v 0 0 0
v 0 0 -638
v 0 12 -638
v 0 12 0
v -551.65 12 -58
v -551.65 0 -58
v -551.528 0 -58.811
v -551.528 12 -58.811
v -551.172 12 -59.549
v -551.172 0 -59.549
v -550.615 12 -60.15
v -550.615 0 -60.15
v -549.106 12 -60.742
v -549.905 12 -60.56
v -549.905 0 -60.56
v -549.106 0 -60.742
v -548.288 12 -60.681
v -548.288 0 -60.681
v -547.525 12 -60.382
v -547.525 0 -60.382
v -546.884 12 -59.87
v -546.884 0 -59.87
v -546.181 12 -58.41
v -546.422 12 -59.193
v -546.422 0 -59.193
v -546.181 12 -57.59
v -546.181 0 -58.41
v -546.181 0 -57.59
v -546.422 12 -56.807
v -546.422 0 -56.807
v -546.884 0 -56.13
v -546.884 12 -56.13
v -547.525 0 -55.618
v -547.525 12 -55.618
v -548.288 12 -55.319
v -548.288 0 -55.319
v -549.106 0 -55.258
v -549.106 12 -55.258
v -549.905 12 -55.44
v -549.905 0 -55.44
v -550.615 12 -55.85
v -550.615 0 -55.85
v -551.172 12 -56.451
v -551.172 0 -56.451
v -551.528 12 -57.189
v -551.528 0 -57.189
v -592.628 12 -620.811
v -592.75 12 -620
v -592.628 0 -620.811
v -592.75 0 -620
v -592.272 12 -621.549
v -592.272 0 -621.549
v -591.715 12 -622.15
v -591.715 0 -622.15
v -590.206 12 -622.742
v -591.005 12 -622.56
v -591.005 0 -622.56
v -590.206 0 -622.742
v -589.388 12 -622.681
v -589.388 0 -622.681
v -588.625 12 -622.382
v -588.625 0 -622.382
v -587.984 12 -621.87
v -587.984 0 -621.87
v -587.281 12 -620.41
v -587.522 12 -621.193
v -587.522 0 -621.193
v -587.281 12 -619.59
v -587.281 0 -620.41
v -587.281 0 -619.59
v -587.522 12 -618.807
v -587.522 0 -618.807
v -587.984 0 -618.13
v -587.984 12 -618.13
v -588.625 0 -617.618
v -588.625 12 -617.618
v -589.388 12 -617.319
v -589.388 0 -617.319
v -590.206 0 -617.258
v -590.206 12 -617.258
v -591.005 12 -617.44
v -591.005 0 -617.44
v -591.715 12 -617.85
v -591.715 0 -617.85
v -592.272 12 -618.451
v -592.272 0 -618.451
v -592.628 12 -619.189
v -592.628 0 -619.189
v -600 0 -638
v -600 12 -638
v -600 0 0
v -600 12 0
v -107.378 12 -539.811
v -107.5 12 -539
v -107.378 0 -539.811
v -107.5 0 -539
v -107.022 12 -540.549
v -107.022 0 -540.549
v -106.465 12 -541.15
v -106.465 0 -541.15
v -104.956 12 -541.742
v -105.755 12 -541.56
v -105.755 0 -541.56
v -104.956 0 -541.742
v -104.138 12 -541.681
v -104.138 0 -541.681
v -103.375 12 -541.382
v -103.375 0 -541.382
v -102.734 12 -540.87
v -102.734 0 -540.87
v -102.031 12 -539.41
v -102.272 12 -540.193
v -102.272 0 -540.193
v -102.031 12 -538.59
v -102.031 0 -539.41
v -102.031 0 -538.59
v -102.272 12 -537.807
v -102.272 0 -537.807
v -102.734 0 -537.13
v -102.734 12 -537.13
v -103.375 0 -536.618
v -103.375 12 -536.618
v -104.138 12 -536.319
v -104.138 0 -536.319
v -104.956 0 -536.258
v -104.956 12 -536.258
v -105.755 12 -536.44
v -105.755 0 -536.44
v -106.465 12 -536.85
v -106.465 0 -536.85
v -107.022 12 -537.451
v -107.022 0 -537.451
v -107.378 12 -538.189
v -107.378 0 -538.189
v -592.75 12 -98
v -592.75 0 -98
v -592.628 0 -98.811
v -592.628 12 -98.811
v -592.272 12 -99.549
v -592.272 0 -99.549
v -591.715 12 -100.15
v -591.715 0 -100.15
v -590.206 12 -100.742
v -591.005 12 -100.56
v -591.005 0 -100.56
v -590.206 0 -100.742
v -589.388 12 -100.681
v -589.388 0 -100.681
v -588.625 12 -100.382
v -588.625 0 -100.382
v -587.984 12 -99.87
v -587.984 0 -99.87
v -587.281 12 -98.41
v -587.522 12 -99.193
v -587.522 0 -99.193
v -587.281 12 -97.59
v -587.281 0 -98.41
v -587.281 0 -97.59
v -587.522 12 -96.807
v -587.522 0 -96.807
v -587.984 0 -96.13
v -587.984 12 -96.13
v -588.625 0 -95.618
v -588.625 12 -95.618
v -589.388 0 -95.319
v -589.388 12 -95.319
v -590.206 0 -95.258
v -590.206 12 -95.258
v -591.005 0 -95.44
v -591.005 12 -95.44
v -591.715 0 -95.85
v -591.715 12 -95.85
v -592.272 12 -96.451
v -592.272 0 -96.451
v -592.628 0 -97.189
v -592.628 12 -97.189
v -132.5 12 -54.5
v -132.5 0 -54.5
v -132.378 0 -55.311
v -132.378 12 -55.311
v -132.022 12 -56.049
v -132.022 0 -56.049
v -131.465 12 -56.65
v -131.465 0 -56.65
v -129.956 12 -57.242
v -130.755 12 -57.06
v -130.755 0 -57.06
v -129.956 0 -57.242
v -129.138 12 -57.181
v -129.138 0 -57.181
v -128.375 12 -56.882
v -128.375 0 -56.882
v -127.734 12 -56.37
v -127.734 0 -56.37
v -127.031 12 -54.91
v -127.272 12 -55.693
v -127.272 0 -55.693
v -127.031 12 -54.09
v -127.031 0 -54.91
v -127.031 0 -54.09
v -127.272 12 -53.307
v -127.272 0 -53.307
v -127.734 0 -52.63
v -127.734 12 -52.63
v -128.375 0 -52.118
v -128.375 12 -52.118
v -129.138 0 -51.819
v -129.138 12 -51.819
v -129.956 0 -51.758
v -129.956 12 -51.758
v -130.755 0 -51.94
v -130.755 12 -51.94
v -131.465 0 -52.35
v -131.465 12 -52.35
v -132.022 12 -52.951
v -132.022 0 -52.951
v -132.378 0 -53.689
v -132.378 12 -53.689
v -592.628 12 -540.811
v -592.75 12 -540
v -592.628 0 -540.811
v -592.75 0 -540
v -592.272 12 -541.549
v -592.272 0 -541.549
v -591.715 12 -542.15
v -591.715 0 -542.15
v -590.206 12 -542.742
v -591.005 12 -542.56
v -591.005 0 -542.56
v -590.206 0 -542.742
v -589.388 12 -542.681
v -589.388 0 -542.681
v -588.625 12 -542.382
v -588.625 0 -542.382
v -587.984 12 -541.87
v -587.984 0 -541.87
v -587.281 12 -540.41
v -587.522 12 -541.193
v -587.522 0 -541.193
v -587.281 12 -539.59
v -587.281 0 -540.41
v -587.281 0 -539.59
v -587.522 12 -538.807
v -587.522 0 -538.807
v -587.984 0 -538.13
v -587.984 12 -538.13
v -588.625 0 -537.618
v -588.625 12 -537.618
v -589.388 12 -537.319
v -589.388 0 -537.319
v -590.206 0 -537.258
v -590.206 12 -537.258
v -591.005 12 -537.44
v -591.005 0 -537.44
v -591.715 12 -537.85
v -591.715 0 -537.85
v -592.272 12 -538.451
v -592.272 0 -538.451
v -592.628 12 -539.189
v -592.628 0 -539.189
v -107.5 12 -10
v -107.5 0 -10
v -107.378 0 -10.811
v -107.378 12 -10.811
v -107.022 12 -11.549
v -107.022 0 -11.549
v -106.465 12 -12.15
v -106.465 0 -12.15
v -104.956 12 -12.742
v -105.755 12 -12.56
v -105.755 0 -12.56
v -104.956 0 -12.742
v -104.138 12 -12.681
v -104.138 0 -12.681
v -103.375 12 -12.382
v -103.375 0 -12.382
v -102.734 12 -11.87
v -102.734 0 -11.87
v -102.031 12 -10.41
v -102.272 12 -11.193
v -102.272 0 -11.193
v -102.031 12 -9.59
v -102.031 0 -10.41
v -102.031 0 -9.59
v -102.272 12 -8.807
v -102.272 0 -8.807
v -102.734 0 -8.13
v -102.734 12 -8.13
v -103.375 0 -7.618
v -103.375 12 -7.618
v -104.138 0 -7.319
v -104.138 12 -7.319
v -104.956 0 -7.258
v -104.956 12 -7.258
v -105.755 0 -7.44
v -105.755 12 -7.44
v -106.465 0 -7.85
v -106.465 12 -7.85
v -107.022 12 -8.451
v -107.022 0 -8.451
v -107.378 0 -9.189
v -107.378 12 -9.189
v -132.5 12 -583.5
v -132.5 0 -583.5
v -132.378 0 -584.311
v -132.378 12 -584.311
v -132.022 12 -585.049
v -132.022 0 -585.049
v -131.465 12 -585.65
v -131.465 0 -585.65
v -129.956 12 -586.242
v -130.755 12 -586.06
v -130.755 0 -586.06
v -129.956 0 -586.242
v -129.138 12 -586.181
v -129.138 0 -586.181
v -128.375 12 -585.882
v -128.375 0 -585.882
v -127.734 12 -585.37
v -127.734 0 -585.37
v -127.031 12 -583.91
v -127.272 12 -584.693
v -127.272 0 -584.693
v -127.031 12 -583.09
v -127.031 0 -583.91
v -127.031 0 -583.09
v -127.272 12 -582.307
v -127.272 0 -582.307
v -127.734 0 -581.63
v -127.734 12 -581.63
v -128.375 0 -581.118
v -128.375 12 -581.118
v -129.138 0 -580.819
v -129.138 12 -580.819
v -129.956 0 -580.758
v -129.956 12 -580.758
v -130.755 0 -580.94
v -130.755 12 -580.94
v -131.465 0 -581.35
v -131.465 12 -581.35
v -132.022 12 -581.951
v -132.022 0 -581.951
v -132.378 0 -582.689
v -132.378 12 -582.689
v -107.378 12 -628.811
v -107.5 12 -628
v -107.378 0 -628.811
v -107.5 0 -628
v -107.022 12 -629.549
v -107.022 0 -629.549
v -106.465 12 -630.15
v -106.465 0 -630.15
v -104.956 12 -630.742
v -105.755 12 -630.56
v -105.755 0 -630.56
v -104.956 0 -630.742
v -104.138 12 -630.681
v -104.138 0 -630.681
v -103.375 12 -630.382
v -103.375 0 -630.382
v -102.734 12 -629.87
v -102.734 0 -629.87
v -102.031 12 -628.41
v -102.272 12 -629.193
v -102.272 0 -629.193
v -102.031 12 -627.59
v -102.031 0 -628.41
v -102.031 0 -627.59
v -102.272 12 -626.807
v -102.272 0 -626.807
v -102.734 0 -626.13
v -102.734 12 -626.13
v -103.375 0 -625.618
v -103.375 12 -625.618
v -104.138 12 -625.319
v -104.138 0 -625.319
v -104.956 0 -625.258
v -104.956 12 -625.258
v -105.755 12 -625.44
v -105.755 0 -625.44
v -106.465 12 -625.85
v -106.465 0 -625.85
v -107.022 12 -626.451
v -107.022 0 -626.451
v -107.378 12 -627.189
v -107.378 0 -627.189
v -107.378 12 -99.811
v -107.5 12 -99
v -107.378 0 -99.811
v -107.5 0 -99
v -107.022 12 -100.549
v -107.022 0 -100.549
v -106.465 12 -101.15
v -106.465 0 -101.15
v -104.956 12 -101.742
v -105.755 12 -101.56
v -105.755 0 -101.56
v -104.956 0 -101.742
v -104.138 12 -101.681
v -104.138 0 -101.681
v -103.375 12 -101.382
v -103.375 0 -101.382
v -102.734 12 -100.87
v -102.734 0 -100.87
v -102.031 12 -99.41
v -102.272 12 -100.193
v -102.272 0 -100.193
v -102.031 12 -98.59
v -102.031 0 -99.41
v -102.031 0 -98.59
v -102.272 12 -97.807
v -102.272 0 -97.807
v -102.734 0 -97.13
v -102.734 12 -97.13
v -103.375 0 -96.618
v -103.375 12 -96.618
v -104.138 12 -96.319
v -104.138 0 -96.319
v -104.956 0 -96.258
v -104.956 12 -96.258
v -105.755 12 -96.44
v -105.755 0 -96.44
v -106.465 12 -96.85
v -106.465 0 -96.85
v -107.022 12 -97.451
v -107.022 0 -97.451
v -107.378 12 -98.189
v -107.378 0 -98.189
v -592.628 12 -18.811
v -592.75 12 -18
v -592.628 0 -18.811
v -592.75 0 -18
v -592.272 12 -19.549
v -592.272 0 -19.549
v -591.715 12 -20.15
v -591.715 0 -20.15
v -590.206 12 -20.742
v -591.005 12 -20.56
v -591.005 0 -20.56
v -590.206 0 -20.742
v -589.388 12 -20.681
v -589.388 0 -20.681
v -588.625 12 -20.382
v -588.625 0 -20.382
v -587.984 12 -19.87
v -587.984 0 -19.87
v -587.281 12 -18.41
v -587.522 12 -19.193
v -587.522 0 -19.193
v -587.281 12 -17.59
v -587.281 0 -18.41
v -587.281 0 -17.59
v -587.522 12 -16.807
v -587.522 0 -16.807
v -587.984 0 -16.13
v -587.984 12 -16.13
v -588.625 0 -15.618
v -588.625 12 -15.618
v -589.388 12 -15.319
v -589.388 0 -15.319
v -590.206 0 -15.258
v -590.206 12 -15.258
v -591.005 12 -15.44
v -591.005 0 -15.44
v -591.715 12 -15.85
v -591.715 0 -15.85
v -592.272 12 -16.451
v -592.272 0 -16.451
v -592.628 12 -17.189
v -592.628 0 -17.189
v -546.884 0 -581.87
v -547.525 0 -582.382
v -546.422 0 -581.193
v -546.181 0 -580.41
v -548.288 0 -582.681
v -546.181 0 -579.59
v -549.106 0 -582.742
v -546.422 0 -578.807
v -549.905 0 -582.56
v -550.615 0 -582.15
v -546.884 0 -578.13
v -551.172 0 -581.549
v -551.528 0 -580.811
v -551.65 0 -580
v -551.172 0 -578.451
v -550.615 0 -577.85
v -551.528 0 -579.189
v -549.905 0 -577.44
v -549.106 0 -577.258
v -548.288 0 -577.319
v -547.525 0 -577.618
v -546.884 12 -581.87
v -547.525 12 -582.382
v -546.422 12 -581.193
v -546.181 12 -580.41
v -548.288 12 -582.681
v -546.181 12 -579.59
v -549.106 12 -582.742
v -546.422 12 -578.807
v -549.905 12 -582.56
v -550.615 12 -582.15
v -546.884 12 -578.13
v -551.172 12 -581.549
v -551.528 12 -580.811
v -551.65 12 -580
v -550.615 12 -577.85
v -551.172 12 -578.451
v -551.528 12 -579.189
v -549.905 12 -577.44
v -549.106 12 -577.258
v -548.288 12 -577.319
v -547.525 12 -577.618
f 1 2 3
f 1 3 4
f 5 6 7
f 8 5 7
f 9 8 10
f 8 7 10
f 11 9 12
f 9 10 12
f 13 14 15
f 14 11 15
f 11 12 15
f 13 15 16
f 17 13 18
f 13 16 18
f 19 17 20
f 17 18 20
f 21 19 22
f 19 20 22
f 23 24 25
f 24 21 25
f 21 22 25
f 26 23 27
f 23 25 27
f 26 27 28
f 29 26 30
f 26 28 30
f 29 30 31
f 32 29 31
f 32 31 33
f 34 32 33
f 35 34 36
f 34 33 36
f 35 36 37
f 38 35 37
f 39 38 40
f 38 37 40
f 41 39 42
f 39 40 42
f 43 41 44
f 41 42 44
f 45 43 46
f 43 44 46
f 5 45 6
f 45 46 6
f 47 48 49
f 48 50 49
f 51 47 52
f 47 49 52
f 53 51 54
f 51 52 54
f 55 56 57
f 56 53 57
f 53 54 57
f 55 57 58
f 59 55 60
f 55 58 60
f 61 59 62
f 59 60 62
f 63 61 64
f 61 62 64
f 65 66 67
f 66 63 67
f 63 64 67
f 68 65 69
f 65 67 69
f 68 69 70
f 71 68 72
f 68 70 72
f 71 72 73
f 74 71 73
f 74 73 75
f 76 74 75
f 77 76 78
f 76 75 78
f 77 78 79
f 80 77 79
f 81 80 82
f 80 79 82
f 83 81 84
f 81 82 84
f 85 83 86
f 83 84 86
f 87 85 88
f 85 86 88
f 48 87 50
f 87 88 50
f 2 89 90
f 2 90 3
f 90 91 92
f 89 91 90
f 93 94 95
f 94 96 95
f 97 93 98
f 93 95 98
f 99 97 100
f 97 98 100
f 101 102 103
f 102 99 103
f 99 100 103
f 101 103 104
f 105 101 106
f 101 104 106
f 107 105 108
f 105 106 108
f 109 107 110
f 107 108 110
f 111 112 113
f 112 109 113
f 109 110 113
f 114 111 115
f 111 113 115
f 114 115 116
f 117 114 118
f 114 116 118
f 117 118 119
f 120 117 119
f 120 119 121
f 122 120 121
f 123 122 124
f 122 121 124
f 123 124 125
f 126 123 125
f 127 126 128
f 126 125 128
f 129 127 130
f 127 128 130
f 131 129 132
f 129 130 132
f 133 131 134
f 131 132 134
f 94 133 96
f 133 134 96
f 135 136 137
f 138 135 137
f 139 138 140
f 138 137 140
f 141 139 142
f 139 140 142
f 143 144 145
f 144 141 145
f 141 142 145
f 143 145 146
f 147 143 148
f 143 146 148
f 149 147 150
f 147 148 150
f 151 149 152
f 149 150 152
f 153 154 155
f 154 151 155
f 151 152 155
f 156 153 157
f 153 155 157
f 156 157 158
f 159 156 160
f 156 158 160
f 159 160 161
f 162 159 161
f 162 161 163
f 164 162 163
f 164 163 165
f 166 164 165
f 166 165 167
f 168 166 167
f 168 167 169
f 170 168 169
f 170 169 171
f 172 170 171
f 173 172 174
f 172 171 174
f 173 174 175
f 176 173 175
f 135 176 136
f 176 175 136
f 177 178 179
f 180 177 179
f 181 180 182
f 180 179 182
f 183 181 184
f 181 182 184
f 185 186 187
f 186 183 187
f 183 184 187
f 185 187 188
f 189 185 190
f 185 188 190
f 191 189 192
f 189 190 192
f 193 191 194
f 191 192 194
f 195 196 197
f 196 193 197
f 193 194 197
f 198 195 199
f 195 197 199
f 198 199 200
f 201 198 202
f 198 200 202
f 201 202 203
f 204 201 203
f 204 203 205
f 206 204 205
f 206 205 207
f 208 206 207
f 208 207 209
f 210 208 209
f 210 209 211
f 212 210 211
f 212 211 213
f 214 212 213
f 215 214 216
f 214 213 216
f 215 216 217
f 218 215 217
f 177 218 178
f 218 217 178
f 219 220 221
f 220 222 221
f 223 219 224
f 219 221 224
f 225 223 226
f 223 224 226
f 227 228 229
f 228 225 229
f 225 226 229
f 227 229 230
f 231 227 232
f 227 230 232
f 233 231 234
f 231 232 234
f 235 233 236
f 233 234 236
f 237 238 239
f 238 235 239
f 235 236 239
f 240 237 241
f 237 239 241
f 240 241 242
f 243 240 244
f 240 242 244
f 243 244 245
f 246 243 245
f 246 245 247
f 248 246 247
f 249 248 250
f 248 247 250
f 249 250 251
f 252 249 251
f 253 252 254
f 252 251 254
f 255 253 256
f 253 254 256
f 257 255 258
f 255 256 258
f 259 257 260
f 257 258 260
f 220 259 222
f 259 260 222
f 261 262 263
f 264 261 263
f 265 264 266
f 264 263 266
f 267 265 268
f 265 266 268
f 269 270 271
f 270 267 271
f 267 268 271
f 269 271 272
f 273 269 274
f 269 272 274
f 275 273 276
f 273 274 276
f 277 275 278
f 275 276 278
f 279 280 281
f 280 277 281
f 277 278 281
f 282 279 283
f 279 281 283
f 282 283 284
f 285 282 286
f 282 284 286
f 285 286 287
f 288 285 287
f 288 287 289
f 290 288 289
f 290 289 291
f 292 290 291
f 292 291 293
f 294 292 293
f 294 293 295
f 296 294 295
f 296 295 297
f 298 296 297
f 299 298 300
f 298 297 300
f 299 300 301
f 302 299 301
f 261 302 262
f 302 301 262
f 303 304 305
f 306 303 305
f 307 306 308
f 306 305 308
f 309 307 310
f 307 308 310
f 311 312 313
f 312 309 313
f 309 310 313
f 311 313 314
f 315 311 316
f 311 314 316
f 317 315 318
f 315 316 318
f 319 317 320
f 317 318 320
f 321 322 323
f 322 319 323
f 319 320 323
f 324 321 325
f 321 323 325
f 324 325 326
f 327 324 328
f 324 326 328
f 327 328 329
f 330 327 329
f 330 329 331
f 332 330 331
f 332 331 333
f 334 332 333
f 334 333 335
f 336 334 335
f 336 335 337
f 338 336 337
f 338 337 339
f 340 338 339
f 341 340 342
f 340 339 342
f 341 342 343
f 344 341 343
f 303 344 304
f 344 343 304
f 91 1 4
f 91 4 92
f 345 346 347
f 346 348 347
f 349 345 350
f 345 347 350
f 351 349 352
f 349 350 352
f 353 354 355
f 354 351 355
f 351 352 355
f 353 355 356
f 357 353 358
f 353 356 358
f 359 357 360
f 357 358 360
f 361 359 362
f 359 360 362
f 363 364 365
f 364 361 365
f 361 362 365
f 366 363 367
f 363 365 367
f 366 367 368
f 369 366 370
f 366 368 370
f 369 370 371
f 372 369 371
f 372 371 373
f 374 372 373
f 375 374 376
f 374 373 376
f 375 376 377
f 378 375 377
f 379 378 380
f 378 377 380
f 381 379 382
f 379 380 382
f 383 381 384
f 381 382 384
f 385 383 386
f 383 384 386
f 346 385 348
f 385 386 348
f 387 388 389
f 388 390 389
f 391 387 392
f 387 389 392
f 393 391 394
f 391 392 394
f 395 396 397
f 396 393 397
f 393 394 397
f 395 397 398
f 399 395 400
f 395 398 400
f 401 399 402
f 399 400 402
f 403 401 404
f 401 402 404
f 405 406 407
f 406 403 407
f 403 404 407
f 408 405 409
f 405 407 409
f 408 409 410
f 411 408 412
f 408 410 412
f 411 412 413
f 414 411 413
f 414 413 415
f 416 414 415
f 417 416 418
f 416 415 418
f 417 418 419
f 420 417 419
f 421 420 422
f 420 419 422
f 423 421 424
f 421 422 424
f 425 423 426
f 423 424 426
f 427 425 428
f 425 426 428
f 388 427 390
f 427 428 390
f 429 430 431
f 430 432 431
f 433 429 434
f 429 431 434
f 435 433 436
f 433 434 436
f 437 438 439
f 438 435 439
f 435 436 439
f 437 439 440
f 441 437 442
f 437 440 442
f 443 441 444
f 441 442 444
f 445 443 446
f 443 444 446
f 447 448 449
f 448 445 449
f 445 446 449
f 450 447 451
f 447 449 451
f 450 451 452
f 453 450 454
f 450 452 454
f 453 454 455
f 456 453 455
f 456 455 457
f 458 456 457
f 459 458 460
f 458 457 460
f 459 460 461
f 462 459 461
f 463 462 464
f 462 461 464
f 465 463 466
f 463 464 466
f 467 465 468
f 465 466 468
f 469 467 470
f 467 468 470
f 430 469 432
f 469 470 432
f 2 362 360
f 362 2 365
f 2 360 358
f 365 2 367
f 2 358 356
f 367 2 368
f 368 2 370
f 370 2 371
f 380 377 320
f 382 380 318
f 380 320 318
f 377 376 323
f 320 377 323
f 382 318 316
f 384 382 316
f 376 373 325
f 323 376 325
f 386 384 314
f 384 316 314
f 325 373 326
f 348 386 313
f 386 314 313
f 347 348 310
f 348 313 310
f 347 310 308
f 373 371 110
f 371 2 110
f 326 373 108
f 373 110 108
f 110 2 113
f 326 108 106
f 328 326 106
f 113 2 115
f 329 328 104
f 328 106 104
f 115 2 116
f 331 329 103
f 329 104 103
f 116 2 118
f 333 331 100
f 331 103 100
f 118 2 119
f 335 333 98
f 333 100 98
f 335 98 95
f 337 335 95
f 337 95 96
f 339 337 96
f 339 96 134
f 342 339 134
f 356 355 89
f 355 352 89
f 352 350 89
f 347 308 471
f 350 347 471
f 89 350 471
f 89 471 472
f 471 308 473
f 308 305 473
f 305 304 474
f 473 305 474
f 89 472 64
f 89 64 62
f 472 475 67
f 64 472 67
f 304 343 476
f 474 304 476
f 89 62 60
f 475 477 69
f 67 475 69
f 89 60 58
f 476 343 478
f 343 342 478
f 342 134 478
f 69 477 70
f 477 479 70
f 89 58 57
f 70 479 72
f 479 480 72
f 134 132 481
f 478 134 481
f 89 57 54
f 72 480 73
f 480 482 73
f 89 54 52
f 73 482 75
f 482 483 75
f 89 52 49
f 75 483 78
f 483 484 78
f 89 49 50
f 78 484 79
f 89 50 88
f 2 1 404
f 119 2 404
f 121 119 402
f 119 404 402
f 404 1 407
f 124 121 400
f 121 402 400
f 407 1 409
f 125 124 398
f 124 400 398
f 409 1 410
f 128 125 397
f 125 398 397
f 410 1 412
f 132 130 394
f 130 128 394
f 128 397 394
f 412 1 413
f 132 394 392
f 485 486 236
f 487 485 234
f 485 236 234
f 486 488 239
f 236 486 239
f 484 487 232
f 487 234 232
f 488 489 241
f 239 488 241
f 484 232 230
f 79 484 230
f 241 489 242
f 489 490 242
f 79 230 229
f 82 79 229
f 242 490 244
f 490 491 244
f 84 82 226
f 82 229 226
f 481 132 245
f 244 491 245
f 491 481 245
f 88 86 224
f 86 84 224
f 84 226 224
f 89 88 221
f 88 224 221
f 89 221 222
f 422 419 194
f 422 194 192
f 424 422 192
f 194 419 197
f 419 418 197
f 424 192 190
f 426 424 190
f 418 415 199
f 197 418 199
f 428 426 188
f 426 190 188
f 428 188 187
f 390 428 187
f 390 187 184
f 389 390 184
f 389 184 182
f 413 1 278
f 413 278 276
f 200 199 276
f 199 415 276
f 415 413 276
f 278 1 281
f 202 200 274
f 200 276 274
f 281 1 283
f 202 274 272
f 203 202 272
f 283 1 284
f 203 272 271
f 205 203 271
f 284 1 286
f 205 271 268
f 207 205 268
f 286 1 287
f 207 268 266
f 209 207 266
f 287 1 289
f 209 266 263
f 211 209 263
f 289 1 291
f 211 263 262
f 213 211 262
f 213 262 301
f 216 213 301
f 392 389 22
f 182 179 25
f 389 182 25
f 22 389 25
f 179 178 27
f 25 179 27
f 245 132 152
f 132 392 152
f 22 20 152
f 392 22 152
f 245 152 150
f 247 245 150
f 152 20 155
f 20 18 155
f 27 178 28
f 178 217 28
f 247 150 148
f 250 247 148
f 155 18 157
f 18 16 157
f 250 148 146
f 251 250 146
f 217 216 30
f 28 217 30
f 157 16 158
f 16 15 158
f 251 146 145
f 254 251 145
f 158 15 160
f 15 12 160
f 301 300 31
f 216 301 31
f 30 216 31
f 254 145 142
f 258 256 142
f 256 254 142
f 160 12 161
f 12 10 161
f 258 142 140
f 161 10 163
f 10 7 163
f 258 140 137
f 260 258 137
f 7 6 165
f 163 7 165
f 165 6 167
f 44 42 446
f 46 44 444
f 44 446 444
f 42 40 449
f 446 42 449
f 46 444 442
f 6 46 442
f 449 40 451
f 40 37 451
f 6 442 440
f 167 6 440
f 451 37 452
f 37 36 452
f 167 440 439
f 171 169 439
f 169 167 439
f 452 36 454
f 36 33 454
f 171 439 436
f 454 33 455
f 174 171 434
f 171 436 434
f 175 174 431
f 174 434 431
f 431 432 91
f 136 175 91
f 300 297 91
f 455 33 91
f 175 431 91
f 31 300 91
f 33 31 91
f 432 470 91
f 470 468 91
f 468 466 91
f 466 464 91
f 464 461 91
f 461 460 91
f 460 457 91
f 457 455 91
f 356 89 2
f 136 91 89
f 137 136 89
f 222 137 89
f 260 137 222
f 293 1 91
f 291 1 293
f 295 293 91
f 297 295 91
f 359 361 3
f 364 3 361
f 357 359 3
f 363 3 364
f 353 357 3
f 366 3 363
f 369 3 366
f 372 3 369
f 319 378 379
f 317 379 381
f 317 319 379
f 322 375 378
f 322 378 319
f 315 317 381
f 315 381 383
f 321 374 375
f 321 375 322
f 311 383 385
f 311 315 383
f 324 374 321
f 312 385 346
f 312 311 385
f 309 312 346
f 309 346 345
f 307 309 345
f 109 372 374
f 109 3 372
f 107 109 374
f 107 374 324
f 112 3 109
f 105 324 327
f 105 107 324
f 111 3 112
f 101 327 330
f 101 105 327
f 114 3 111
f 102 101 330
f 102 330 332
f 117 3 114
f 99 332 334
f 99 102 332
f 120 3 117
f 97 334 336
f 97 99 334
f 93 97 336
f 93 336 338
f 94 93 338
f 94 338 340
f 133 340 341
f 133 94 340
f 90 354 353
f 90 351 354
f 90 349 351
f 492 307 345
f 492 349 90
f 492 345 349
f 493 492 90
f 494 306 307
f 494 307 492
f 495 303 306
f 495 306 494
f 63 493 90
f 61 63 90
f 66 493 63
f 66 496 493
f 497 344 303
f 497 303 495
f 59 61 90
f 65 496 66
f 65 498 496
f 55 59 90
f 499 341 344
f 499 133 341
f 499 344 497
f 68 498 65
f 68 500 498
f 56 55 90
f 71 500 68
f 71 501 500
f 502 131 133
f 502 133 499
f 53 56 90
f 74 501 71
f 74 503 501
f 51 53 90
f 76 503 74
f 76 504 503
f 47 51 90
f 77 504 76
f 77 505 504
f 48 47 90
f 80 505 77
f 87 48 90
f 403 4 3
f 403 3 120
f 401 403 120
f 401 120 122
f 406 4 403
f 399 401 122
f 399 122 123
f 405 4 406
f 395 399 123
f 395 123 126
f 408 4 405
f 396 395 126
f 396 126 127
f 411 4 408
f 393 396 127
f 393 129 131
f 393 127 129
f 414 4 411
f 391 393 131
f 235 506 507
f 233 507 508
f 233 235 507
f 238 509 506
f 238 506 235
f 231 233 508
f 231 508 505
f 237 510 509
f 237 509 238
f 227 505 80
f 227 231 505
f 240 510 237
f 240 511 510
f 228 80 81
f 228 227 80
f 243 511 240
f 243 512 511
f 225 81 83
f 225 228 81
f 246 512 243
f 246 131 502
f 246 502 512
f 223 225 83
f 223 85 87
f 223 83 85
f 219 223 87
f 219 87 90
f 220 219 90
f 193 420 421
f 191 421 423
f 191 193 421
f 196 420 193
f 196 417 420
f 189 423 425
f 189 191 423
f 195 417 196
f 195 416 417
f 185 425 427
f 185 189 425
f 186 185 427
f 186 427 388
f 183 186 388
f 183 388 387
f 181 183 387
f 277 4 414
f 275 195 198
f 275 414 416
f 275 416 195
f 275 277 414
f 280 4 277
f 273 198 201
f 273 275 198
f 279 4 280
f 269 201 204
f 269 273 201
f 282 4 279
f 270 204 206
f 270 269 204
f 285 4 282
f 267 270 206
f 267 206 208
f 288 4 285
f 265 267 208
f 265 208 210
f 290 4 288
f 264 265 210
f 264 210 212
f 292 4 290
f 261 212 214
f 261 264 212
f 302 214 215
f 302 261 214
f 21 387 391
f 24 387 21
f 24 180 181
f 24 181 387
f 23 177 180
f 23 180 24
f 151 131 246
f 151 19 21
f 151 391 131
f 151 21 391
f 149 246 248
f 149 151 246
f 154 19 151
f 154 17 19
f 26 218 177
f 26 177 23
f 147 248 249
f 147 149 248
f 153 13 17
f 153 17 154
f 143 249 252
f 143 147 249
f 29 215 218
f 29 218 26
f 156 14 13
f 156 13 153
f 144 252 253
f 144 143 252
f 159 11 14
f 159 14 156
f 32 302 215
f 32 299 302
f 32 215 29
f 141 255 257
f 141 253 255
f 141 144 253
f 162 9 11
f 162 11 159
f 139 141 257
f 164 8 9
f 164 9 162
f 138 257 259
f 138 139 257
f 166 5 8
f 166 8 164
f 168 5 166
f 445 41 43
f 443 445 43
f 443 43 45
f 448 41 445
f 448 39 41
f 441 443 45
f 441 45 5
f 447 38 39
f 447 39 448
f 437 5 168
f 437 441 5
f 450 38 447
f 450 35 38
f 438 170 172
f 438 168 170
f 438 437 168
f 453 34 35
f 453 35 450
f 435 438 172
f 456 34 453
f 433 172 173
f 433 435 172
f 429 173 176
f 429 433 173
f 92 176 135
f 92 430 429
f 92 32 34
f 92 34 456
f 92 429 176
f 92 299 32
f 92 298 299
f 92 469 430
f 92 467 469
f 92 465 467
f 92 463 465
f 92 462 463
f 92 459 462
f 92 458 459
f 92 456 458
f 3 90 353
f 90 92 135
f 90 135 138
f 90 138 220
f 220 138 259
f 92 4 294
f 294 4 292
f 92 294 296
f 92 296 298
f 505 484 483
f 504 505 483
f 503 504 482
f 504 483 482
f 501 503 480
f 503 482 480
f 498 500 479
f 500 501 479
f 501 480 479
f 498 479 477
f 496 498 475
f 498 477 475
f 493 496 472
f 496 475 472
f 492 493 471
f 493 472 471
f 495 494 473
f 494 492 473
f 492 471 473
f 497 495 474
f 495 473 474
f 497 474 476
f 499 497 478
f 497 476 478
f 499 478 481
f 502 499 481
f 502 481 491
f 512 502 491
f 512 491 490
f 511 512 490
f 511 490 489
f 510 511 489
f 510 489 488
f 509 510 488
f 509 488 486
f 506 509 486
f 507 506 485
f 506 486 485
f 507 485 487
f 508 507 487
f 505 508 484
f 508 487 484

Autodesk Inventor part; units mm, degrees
ref_plane "YZ Plane" through (0, 0, 0) normal (1, 0, 0) x (0, 1, 0)
ref_plane "XZ Plane" through (0, 0, 0) normal (0, 1, 0) x (-1, 0, 0)
ref_plane "XY Plane" through (0, 0, 0) normal (0, 0, 1) x (1, 0, 0)
sketch "Sketch1" plane through (0, 0, 0) normal (0, 1, 0) x (-1, 0, 0)
  line L0 (0, 0) -> (600, 0)
  line L1 (600, 0) -> (600, -638)
  line L2 (600, -638) -> (0, -638)
  line L3 (0, -638) -> (0, 0)
  circle A0 centre (104.75, -628) radius 2.75
  circle A1 centre (104.75, -539) radius 2.75
  circle A2 centre (129.75, -583.5) radius 2.75
  circle A3 centre (590, -620) radius 2.75
  circle A4 centre (590, -540) radius 2.75
  circle A5 centre (548.9, -580) radius 2.75
  line L4 (0, -319) -> (600, -319) construction
  circle A6 centre (104.75, -10) radius 2.75
  circle A7 centre (104.75, -99) radius 2.75
  circle A8 centre (129.75, -54.5) radius 2.75
  circle A9 centre (590, -18) radius 2.75
  circle A10 centre (590, -98) radius 2.75
  circle A11 centre (548.9, -58) radius 2.75
  dimension "d0" = 638
  dimension "d1" = 600
  dimension "d4" = 5.5
  dimension "d5" = 495.25
  dimension "d6" = 10
  dimension "d7" = 5.5
  dimension "d8" = 89
  dimension "d9" = 495.25
  dimension "d10" = 5.5
  dimension "d11" = 44.5
  dimension "d12" = 25
  dimension "d13" = 5.5
  dimension "d14" = 10
  dimension "d15" = 18
  dimension "d16" = 5.5
  dimension "d17" = 5.5
  dimension "d18" = 80
  dimension "d19" = 10
  dimension "d20" = 40
  dimension "d21" = 41.1
extrude "Extrusion1" add sketch "Sketch1" along normal blind 12
equation "\"d9\" = d5"
equation "\"d11\" = 0.5 * d8"
equation "\"d19\" = d14"
equation "\"d20\" = 0.5 * d18"
properties part number "MDFBase"
